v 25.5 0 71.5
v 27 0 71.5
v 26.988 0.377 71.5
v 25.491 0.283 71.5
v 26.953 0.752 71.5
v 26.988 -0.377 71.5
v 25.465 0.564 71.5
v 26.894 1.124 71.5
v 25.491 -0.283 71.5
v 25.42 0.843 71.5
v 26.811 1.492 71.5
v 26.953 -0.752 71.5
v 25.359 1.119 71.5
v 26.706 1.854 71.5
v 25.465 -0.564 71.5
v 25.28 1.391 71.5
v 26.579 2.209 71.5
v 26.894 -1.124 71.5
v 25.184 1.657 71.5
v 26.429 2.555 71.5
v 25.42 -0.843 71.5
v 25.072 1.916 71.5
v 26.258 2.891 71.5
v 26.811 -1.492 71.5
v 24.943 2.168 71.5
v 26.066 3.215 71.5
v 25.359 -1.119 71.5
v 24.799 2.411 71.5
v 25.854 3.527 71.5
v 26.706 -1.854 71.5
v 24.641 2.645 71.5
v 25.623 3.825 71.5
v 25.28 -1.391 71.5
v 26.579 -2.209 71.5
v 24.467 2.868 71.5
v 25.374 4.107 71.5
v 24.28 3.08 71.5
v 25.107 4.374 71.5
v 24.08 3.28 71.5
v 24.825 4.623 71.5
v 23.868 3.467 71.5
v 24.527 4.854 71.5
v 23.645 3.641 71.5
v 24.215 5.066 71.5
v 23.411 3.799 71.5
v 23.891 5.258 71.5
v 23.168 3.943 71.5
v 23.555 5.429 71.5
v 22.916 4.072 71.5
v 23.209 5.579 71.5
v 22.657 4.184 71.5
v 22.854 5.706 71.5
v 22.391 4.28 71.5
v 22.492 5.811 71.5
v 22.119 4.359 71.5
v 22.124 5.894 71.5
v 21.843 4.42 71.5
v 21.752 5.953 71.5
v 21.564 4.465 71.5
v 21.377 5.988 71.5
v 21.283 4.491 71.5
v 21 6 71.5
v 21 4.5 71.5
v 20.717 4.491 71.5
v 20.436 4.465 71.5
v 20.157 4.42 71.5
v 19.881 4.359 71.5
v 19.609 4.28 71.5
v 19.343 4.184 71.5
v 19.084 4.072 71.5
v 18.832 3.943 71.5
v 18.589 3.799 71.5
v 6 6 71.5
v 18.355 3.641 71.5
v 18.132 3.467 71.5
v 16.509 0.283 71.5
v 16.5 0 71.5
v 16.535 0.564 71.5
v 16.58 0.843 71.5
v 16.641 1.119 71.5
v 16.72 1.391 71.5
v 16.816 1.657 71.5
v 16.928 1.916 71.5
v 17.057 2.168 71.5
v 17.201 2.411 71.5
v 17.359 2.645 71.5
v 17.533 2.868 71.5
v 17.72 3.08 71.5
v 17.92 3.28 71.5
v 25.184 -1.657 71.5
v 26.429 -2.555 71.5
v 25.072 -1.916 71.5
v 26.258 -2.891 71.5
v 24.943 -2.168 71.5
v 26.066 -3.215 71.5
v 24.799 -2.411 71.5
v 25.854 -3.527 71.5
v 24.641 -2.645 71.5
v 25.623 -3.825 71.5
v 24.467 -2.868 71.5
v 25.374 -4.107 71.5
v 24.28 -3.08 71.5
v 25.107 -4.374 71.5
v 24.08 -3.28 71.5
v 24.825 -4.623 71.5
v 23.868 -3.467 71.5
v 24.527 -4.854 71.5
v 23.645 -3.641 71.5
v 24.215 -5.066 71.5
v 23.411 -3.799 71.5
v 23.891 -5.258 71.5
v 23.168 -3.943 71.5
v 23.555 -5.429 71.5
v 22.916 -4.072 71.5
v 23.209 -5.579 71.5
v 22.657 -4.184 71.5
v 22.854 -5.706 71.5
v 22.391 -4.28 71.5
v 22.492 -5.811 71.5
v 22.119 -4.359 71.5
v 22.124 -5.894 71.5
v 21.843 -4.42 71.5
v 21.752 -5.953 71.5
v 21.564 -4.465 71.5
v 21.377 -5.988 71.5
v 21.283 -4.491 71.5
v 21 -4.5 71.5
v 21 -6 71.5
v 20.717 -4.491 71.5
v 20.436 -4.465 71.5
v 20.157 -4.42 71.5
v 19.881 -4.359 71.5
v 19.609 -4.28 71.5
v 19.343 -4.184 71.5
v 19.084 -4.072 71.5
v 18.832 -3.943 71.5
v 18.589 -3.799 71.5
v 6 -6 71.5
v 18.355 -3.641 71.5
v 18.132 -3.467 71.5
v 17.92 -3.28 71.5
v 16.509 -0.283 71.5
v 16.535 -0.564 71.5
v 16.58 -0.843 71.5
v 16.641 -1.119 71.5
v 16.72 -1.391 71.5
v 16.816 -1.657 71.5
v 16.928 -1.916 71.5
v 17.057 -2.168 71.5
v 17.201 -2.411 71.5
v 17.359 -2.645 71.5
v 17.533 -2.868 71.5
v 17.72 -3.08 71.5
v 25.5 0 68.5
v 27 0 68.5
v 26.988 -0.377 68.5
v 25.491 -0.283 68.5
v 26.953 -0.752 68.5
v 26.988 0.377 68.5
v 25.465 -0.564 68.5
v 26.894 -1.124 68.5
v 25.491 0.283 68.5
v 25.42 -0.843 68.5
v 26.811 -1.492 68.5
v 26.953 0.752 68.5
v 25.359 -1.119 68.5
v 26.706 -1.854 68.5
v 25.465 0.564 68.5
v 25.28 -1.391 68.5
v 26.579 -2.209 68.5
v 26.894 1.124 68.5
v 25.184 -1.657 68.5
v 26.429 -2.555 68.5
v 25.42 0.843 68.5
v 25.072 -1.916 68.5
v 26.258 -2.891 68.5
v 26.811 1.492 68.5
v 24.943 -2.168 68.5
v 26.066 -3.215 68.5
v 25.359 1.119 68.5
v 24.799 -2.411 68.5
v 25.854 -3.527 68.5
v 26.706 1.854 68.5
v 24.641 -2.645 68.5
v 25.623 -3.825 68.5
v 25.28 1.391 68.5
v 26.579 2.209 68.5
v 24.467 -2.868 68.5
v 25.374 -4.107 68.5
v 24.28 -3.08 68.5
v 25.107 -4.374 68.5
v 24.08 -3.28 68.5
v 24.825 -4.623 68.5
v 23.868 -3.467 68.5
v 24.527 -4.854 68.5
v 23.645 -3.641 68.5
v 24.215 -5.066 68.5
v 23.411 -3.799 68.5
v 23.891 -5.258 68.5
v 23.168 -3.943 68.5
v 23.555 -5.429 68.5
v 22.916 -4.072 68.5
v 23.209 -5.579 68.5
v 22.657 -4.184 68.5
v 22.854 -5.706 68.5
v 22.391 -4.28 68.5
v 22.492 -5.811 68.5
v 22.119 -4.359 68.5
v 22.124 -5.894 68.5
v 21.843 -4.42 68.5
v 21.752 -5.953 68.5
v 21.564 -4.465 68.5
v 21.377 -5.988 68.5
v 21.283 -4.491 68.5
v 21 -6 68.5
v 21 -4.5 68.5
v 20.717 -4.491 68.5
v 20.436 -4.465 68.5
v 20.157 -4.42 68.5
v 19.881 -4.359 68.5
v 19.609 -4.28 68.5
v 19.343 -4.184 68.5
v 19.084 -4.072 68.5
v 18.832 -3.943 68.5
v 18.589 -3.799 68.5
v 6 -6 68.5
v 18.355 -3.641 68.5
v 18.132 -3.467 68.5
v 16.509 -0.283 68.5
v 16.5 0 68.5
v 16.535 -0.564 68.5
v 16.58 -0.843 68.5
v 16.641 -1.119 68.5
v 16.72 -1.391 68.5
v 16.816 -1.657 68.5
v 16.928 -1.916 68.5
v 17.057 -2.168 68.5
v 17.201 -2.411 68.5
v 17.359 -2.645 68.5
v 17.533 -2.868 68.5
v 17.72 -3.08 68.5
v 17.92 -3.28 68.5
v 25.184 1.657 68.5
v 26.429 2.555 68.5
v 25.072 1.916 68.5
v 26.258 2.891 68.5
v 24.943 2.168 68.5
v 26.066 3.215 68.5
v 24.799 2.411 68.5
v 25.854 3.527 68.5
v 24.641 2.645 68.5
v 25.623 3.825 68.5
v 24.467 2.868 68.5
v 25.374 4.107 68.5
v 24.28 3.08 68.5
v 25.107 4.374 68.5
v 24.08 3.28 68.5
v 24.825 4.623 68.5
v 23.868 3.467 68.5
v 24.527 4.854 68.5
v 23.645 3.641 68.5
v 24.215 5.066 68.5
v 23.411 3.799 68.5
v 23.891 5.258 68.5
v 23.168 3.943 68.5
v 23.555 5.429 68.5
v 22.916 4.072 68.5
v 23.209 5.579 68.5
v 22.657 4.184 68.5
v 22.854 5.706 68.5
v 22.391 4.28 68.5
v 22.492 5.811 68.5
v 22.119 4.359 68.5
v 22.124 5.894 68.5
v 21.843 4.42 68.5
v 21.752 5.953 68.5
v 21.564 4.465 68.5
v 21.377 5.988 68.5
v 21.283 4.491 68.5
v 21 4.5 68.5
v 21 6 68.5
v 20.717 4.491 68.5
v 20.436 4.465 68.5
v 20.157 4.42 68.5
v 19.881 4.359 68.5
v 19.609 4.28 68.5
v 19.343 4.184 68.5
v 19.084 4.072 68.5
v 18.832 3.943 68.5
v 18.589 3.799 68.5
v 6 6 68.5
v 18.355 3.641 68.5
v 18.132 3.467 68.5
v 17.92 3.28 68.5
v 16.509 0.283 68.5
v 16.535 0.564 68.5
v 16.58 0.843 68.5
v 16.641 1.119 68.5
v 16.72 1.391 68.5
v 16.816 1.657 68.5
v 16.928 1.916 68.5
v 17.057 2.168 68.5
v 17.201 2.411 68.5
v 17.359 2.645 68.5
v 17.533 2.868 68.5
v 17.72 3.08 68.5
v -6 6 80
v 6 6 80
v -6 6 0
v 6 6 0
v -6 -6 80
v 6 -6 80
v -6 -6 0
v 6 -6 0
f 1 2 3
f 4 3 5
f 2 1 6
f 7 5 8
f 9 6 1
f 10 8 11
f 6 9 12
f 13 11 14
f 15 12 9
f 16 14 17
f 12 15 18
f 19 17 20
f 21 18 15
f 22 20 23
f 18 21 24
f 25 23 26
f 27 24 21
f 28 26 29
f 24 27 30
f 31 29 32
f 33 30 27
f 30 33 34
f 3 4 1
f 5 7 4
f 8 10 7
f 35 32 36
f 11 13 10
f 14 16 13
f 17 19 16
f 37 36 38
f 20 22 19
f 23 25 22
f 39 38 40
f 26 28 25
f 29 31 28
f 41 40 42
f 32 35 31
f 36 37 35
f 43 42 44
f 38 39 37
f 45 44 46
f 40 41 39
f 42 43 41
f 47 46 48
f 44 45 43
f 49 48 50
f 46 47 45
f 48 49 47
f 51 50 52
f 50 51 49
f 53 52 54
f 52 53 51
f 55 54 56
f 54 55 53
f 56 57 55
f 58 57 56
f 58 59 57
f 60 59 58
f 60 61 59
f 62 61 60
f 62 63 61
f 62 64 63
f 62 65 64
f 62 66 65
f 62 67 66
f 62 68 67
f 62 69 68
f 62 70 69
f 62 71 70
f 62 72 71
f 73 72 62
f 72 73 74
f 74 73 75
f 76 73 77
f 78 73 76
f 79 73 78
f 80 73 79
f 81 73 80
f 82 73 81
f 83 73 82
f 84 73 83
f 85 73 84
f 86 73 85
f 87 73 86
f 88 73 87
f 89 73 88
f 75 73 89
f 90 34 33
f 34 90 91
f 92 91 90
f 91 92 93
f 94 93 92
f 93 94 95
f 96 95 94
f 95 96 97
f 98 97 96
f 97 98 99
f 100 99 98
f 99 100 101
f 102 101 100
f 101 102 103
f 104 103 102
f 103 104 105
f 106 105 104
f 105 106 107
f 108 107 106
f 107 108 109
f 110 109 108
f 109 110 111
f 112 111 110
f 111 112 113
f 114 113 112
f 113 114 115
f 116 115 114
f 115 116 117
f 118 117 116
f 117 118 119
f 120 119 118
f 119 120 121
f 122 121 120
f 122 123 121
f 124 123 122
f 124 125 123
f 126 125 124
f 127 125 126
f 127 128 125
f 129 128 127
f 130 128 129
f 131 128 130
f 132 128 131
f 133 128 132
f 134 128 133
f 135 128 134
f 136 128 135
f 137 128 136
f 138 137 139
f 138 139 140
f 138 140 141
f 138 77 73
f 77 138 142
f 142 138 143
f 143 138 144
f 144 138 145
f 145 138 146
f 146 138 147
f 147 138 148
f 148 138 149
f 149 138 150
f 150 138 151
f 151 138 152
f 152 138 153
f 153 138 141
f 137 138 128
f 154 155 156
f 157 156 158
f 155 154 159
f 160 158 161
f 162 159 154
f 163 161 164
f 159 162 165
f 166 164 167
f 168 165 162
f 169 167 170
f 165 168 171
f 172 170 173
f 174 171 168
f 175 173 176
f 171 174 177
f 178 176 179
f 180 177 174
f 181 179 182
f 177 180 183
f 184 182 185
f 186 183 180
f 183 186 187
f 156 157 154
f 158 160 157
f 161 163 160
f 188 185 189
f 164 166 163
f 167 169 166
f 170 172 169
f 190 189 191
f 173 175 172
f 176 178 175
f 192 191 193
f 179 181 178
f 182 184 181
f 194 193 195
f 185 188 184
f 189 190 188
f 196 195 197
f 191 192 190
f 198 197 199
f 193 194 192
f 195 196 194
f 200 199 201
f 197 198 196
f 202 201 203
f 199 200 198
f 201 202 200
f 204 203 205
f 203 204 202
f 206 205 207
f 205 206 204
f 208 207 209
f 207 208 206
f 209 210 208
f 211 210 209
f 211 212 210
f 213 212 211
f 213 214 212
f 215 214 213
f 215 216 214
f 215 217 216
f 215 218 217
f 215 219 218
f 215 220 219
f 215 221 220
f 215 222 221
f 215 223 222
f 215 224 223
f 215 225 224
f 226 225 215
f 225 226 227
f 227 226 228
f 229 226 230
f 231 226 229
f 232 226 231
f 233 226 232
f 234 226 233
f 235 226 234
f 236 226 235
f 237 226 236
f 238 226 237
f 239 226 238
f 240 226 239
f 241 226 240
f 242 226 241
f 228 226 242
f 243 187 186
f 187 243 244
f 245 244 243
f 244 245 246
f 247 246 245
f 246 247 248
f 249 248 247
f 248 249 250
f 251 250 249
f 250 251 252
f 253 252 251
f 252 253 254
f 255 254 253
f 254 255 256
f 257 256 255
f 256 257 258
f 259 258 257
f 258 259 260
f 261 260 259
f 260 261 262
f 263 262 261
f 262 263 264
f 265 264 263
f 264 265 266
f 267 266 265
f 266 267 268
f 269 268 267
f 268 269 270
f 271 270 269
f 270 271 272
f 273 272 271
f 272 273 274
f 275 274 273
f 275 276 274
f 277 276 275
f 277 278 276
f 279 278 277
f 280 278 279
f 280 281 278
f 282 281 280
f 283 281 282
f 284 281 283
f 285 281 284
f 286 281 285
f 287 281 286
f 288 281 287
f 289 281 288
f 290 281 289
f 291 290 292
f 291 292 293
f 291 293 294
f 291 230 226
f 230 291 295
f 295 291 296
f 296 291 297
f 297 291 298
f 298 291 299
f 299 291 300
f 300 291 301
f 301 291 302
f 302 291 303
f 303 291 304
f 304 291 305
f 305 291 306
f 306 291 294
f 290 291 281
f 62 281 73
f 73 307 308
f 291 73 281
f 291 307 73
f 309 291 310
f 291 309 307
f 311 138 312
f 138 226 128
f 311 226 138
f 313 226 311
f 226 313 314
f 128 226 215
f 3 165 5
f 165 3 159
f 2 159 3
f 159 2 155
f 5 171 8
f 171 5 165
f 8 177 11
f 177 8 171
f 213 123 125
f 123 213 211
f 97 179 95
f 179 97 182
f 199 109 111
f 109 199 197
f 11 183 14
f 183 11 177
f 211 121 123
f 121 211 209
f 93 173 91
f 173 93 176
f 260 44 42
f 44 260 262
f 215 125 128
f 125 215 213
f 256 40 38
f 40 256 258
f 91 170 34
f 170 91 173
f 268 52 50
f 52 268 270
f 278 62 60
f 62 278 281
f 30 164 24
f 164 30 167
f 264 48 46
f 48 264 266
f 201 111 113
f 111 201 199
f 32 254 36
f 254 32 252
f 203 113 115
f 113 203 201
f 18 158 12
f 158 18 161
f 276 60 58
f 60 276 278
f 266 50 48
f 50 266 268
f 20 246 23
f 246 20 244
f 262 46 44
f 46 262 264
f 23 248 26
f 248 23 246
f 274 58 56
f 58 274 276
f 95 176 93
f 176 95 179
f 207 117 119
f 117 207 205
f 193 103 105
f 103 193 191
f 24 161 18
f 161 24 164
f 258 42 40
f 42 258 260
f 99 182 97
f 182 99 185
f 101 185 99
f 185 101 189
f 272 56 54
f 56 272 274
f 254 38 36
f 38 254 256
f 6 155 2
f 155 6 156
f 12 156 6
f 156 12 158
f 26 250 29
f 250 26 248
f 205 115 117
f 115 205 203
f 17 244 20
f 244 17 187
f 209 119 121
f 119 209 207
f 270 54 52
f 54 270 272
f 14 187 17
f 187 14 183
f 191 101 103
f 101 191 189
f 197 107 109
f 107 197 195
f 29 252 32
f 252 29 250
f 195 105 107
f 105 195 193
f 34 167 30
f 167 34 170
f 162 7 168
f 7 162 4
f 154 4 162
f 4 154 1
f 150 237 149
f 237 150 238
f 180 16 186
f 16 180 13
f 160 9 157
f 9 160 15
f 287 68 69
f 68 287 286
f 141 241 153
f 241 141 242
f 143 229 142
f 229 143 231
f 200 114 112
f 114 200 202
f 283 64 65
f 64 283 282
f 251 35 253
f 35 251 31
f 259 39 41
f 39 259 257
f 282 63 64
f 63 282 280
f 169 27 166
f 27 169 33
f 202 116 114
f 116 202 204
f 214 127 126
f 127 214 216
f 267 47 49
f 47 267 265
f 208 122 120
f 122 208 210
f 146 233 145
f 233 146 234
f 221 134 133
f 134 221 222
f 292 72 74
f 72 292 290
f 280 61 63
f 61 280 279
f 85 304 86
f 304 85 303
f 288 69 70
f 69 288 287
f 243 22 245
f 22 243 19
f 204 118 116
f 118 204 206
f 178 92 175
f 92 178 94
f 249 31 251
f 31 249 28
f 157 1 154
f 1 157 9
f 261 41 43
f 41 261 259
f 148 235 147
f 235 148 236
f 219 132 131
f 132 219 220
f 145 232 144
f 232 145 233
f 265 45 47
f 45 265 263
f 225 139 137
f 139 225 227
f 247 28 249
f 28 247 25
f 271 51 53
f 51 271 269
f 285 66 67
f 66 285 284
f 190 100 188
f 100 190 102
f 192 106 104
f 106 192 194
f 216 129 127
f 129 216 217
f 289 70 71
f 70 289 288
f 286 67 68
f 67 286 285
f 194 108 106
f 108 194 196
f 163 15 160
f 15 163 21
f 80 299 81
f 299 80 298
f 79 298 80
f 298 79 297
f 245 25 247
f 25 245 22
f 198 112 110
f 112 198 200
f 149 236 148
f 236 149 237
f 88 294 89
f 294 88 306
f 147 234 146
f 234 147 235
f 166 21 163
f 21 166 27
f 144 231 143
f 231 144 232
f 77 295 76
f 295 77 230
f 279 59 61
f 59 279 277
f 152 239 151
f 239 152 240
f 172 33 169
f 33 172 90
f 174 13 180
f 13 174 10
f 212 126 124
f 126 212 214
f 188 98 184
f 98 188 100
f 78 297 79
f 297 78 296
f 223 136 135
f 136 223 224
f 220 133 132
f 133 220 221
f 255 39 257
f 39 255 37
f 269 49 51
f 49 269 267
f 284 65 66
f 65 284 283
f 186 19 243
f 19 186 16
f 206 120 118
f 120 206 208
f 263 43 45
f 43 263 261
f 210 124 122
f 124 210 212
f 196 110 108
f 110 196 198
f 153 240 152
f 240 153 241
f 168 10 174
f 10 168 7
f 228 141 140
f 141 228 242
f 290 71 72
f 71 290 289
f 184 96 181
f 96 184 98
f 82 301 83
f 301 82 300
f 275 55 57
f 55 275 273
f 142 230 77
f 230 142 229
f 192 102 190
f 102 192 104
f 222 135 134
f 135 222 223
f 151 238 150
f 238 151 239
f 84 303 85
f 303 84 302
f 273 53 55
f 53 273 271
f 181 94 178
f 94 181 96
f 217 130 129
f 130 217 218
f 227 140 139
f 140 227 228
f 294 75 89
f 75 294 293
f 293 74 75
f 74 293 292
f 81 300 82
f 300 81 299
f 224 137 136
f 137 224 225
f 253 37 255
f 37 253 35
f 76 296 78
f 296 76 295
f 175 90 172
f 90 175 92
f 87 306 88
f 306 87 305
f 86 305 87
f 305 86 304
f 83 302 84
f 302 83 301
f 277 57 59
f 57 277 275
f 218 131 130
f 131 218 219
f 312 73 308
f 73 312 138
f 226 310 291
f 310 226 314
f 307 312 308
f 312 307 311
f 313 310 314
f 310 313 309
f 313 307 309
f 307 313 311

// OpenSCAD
$fn=100;
translate([0,0,40]){
    cube([12,12,80], center=true);
    translate([12,0,30]){
        difference(){
            union(){
                cube([18,12,3], center=true);
                translate([9,0,0]){cylinder(d=12, h=3, center=true);}
            }
            translate([9,0,-1]){cylinder(d=9, h=6, center=true);}
        }
    }
}
